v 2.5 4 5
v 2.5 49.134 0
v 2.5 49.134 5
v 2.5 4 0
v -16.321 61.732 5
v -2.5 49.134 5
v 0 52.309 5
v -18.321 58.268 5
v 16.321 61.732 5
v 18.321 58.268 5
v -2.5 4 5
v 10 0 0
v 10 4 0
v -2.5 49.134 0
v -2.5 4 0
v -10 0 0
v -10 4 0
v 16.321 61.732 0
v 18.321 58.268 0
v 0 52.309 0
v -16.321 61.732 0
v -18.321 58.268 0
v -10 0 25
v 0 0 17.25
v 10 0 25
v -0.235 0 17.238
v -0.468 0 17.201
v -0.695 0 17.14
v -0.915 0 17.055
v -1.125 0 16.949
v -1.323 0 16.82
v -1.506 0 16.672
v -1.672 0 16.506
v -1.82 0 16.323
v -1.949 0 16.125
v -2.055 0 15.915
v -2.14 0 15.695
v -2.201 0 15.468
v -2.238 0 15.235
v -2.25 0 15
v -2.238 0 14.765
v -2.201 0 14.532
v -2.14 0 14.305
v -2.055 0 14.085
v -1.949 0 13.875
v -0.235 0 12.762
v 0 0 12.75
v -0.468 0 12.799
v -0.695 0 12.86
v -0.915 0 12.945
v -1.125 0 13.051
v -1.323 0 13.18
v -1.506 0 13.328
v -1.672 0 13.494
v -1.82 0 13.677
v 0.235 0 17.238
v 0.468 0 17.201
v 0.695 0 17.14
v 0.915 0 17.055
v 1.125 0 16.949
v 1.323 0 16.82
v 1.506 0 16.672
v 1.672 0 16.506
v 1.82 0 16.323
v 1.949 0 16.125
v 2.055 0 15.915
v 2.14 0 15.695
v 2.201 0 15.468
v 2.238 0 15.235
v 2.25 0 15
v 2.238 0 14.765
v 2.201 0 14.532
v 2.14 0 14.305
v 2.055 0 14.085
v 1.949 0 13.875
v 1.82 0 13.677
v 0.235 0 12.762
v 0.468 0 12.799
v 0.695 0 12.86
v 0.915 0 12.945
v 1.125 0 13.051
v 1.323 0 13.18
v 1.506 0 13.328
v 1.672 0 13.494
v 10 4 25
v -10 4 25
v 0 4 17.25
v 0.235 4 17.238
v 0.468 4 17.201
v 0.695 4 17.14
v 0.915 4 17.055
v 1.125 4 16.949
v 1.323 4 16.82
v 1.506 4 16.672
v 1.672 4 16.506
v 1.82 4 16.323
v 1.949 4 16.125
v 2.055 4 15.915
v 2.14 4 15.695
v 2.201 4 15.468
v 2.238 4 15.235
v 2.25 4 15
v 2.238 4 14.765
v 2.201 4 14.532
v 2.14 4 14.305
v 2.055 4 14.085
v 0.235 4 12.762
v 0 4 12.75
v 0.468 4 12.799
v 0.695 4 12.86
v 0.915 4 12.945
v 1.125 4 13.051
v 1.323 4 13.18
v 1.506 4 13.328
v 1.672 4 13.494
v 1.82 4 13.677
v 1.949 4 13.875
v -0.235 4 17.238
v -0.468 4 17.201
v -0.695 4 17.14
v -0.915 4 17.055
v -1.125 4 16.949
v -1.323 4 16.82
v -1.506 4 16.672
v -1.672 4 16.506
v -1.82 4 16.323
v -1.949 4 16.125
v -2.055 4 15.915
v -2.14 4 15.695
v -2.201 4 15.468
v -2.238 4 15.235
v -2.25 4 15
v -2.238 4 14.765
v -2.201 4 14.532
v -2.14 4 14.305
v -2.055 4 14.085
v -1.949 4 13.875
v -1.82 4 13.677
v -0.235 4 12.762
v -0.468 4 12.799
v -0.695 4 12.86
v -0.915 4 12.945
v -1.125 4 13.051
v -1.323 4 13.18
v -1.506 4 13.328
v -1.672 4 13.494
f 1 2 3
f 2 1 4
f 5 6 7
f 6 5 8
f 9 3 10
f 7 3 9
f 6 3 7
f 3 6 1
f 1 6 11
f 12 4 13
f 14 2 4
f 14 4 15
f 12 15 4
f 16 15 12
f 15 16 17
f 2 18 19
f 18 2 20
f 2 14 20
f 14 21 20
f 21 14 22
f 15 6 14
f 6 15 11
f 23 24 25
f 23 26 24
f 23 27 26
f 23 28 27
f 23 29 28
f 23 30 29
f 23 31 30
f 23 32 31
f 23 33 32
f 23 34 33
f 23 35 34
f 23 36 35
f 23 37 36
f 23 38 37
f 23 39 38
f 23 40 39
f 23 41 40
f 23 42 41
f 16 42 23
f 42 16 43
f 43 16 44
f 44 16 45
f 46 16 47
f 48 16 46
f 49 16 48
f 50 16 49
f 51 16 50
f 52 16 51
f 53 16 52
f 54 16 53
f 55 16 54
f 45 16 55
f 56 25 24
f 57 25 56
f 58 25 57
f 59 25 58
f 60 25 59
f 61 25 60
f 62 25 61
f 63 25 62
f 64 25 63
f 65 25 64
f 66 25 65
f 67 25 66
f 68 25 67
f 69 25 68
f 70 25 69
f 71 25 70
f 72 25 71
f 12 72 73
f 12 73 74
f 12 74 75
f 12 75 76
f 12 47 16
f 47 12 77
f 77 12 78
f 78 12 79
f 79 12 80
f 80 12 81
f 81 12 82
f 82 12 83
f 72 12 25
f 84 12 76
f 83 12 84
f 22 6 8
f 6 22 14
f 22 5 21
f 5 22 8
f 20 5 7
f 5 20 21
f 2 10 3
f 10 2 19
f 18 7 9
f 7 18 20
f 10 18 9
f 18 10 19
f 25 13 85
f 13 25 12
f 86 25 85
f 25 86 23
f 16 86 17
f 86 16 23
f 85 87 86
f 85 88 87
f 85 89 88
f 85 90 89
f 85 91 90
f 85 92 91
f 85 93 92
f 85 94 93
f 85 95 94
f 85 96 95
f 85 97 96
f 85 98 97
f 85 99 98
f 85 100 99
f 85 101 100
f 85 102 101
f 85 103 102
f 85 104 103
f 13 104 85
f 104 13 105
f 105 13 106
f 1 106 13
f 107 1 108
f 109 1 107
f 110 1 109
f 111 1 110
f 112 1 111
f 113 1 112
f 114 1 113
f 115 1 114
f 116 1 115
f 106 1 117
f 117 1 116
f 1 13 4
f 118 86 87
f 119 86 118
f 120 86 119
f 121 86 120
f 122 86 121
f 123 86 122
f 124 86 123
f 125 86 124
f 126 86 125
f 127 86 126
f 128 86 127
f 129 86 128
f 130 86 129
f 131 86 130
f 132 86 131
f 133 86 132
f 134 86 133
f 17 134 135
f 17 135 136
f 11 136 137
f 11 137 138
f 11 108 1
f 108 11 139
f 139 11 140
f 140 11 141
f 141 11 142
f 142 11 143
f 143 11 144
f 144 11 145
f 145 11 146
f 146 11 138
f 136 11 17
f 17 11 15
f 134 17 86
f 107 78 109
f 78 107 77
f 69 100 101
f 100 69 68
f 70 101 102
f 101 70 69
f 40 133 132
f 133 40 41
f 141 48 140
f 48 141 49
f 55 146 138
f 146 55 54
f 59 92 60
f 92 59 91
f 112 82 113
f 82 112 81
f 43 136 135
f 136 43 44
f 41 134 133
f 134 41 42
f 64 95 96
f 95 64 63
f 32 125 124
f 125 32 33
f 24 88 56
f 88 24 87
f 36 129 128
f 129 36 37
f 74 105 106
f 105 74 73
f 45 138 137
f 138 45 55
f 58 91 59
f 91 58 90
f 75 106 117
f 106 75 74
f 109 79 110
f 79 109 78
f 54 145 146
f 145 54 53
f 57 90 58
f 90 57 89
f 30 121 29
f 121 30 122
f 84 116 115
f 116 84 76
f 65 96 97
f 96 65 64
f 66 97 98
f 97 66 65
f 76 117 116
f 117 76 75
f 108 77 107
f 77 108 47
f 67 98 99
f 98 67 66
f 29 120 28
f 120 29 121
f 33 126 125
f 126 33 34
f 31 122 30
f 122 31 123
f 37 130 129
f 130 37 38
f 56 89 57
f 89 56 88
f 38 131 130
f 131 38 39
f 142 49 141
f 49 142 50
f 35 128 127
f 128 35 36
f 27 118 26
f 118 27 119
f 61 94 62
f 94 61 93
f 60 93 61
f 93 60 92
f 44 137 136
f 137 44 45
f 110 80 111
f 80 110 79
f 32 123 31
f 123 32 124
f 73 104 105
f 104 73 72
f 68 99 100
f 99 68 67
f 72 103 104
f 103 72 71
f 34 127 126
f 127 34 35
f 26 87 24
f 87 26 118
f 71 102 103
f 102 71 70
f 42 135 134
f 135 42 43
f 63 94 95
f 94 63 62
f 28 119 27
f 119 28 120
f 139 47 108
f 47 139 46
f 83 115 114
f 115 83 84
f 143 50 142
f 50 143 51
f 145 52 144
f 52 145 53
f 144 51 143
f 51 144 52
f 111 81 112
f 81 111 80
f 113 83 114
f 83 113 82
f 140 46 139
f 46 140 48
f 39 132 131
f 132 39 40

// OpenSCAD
// ==== Thông số ====
thickness = 5;   // độ dày theo trục Z
stem_height = 50; // chiều cao thân dọc
stem_width = 5;   // độ rộng thân dọc
arm_length =20;  // độ dài mỗi nhánh
arm_width = 4;    // độ rộng nhánh
angle_out = 60;   // góc xoay hai nhánh ra ngoài (độ)

difference() {
    union() {
        // Thân dọc (giữa chữ Y)
        translate([-stem_width/2, 0, 0])
            cube([stem_width, stem_height, thickness]);

        // Nhánh trái
        translate([0, stem_height, 0])
            rotate([0, 0, angle_out])
                translate([-arm_width/2, 0, 0])
                    cube([arm_width, arm_length, thickness]);

        // Nhánh phải
        translate([0, stem_height, 0])
            rotate([0, 0, -angle_out])
                translate([-arm_width/2, 0, 0])
                    cube([arm_width, arm_length, thickness]);
        // Left flange
        translate([-10, 0, 0])
        cube([20, 4, 25], center = false);
       
    } 
   // Holes for M4 bolts (Ø4.5 mm)
    translate([0, 0, 15])
    rotate([90, 0, 0])
        cylinder(h =  10, r = 2.25, center = true, $fn = 60);
    
}
